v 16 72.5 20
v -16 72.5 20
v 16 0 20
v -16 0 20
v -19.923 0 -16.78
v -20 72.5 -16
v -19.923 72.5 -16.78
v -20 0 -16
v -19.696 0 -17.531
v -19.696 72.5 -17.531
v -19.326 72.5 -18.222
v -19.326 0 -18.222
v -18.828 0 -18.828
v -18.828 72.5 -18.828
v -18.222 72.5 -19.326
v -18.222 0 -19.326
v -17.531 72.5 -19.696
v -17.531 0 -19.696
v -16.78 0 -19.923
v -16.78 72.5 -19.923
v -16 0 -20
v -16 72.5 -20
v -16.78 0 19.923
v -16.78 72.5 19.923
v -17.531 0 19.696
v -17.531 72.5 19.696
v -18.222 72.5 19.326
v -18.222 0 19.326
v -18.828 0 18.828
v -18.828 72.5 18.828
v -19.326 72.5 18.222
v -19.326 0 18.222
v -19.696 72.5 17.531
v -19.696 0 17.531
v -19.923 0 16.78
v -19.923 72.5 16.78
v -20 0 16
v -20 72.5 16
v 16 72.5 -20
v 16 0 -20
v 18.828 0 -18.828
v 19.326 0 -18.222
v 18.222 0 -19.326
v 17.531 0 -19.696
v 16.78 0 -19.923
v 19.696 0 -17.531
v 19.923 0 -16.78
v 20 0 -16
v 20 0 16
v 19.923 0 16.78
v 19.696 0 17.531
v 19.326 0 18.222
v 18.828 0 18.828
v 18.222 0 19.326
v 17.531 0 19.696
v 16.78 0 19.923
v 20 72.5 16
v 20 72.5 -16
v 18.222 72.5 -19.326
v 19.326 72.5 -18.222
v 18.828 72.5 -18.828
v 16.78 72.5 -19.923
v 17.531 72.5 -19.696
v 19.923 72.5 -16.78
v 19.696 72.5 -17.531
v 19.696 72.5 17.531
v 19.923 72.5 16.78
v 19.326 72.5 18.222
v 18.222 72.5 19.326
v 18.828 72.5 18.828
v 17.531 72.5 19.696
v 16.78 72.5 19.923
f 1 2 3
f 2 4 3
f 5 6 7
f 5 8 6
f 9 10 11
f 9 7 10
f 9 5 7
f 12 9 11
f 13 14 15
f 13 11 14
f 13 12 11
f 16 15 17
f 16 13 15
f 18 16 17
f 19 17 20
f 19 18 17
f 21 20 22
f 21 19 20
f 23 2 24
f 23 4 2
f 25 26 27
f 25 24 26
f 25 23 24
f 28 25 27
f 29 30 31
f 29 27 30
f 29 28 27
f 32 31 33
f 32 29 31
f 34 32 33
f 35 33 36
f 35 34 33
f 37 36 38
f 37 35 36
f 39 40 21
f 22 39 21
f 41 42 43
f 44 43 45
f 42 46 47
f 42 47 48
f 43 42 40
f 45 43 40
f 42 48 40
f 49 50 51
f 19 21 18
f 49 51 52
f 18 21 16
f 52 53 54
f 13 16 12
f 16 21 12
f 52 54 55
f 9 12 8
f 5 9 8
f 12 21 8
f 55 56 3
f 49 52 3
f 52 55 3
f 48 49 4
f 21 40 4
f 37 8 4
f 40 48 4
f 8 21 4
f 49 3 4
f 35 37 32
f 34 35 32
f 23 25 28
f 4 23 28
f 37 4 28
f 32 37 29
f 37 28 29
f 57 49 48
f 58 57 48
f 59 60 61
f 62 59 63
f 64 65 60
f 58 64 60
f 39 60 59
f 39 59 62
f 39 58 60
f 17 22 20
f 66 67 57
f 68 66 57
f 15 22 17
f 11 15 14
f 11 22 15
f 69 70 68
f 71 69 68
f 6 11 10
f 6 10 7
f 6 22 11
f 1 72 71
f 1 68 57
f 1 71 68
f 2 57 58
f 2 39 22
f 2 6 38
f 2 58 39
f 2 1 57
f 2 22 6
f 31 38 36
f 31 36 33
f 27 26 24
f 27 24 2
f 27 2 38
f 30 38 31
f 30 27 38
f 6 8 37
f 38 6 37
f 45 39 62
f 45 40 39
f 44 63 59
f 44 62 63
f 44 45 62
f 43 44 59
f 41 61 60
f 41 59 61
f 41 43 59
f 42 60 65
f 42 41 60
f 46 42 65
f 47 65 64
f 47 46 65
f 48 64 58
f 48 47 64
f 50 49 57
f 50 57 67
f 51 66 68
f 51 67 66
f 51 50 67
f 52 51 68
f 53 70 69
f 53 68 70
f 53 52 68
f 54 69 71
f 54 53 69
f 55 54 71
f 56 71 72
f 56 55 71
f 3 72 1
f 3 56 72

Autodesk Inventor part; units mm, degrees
ref_plane "YZ Plane" through (0, 0, 0) normal (1, 0, 0) x (0, 1, 0)
ref_plane "XZ Plane" through (0, 0, 0) normal (0, 1, 0) x (-1, 0, 0)
ref_plane "XY Plane" through (0, 0, 0) normal (0, 0, 1) x (1, 0, 0)
sketch "Sketch1" plane through (0, 0, 0) normal (0, 1, 0) x (-1, 0, 0)
  line L0 (0, 12.4728) -> (0, -12.4728) construction
  line L1 (2.135, 0) -> (-2.135, 0) construction
  line L2 (16, 20) -> (-16, 20)
  line L3 (-20, 16) -> (-20, -16)
  line L4 (-16, -20) -> (16, -20)
  line L5 (20, -16) -> (20, 16)
  arc A0 (-16, 20) -> (-20, 16) centre (-16, 16) ccw
  arc A1 (-20, -16) -> (-16, -20) centre (-16, -16) ccw
  arc A2 (16, -20) -> (20, -16) centre (16, -16) ccw
  arc A3 (20, 16) -> (16, 20) centre (16, 16) ccw
  point P0 (0, 0)
  point P1 (0, 0)
  dimension "d1" = 4
  dimension "d2" = 4
  dimension "d3" = 40
extrude "Extrusion1" add sketch "Sketch1" along normal blind 72.5
properties part number "item40x40_1000"
